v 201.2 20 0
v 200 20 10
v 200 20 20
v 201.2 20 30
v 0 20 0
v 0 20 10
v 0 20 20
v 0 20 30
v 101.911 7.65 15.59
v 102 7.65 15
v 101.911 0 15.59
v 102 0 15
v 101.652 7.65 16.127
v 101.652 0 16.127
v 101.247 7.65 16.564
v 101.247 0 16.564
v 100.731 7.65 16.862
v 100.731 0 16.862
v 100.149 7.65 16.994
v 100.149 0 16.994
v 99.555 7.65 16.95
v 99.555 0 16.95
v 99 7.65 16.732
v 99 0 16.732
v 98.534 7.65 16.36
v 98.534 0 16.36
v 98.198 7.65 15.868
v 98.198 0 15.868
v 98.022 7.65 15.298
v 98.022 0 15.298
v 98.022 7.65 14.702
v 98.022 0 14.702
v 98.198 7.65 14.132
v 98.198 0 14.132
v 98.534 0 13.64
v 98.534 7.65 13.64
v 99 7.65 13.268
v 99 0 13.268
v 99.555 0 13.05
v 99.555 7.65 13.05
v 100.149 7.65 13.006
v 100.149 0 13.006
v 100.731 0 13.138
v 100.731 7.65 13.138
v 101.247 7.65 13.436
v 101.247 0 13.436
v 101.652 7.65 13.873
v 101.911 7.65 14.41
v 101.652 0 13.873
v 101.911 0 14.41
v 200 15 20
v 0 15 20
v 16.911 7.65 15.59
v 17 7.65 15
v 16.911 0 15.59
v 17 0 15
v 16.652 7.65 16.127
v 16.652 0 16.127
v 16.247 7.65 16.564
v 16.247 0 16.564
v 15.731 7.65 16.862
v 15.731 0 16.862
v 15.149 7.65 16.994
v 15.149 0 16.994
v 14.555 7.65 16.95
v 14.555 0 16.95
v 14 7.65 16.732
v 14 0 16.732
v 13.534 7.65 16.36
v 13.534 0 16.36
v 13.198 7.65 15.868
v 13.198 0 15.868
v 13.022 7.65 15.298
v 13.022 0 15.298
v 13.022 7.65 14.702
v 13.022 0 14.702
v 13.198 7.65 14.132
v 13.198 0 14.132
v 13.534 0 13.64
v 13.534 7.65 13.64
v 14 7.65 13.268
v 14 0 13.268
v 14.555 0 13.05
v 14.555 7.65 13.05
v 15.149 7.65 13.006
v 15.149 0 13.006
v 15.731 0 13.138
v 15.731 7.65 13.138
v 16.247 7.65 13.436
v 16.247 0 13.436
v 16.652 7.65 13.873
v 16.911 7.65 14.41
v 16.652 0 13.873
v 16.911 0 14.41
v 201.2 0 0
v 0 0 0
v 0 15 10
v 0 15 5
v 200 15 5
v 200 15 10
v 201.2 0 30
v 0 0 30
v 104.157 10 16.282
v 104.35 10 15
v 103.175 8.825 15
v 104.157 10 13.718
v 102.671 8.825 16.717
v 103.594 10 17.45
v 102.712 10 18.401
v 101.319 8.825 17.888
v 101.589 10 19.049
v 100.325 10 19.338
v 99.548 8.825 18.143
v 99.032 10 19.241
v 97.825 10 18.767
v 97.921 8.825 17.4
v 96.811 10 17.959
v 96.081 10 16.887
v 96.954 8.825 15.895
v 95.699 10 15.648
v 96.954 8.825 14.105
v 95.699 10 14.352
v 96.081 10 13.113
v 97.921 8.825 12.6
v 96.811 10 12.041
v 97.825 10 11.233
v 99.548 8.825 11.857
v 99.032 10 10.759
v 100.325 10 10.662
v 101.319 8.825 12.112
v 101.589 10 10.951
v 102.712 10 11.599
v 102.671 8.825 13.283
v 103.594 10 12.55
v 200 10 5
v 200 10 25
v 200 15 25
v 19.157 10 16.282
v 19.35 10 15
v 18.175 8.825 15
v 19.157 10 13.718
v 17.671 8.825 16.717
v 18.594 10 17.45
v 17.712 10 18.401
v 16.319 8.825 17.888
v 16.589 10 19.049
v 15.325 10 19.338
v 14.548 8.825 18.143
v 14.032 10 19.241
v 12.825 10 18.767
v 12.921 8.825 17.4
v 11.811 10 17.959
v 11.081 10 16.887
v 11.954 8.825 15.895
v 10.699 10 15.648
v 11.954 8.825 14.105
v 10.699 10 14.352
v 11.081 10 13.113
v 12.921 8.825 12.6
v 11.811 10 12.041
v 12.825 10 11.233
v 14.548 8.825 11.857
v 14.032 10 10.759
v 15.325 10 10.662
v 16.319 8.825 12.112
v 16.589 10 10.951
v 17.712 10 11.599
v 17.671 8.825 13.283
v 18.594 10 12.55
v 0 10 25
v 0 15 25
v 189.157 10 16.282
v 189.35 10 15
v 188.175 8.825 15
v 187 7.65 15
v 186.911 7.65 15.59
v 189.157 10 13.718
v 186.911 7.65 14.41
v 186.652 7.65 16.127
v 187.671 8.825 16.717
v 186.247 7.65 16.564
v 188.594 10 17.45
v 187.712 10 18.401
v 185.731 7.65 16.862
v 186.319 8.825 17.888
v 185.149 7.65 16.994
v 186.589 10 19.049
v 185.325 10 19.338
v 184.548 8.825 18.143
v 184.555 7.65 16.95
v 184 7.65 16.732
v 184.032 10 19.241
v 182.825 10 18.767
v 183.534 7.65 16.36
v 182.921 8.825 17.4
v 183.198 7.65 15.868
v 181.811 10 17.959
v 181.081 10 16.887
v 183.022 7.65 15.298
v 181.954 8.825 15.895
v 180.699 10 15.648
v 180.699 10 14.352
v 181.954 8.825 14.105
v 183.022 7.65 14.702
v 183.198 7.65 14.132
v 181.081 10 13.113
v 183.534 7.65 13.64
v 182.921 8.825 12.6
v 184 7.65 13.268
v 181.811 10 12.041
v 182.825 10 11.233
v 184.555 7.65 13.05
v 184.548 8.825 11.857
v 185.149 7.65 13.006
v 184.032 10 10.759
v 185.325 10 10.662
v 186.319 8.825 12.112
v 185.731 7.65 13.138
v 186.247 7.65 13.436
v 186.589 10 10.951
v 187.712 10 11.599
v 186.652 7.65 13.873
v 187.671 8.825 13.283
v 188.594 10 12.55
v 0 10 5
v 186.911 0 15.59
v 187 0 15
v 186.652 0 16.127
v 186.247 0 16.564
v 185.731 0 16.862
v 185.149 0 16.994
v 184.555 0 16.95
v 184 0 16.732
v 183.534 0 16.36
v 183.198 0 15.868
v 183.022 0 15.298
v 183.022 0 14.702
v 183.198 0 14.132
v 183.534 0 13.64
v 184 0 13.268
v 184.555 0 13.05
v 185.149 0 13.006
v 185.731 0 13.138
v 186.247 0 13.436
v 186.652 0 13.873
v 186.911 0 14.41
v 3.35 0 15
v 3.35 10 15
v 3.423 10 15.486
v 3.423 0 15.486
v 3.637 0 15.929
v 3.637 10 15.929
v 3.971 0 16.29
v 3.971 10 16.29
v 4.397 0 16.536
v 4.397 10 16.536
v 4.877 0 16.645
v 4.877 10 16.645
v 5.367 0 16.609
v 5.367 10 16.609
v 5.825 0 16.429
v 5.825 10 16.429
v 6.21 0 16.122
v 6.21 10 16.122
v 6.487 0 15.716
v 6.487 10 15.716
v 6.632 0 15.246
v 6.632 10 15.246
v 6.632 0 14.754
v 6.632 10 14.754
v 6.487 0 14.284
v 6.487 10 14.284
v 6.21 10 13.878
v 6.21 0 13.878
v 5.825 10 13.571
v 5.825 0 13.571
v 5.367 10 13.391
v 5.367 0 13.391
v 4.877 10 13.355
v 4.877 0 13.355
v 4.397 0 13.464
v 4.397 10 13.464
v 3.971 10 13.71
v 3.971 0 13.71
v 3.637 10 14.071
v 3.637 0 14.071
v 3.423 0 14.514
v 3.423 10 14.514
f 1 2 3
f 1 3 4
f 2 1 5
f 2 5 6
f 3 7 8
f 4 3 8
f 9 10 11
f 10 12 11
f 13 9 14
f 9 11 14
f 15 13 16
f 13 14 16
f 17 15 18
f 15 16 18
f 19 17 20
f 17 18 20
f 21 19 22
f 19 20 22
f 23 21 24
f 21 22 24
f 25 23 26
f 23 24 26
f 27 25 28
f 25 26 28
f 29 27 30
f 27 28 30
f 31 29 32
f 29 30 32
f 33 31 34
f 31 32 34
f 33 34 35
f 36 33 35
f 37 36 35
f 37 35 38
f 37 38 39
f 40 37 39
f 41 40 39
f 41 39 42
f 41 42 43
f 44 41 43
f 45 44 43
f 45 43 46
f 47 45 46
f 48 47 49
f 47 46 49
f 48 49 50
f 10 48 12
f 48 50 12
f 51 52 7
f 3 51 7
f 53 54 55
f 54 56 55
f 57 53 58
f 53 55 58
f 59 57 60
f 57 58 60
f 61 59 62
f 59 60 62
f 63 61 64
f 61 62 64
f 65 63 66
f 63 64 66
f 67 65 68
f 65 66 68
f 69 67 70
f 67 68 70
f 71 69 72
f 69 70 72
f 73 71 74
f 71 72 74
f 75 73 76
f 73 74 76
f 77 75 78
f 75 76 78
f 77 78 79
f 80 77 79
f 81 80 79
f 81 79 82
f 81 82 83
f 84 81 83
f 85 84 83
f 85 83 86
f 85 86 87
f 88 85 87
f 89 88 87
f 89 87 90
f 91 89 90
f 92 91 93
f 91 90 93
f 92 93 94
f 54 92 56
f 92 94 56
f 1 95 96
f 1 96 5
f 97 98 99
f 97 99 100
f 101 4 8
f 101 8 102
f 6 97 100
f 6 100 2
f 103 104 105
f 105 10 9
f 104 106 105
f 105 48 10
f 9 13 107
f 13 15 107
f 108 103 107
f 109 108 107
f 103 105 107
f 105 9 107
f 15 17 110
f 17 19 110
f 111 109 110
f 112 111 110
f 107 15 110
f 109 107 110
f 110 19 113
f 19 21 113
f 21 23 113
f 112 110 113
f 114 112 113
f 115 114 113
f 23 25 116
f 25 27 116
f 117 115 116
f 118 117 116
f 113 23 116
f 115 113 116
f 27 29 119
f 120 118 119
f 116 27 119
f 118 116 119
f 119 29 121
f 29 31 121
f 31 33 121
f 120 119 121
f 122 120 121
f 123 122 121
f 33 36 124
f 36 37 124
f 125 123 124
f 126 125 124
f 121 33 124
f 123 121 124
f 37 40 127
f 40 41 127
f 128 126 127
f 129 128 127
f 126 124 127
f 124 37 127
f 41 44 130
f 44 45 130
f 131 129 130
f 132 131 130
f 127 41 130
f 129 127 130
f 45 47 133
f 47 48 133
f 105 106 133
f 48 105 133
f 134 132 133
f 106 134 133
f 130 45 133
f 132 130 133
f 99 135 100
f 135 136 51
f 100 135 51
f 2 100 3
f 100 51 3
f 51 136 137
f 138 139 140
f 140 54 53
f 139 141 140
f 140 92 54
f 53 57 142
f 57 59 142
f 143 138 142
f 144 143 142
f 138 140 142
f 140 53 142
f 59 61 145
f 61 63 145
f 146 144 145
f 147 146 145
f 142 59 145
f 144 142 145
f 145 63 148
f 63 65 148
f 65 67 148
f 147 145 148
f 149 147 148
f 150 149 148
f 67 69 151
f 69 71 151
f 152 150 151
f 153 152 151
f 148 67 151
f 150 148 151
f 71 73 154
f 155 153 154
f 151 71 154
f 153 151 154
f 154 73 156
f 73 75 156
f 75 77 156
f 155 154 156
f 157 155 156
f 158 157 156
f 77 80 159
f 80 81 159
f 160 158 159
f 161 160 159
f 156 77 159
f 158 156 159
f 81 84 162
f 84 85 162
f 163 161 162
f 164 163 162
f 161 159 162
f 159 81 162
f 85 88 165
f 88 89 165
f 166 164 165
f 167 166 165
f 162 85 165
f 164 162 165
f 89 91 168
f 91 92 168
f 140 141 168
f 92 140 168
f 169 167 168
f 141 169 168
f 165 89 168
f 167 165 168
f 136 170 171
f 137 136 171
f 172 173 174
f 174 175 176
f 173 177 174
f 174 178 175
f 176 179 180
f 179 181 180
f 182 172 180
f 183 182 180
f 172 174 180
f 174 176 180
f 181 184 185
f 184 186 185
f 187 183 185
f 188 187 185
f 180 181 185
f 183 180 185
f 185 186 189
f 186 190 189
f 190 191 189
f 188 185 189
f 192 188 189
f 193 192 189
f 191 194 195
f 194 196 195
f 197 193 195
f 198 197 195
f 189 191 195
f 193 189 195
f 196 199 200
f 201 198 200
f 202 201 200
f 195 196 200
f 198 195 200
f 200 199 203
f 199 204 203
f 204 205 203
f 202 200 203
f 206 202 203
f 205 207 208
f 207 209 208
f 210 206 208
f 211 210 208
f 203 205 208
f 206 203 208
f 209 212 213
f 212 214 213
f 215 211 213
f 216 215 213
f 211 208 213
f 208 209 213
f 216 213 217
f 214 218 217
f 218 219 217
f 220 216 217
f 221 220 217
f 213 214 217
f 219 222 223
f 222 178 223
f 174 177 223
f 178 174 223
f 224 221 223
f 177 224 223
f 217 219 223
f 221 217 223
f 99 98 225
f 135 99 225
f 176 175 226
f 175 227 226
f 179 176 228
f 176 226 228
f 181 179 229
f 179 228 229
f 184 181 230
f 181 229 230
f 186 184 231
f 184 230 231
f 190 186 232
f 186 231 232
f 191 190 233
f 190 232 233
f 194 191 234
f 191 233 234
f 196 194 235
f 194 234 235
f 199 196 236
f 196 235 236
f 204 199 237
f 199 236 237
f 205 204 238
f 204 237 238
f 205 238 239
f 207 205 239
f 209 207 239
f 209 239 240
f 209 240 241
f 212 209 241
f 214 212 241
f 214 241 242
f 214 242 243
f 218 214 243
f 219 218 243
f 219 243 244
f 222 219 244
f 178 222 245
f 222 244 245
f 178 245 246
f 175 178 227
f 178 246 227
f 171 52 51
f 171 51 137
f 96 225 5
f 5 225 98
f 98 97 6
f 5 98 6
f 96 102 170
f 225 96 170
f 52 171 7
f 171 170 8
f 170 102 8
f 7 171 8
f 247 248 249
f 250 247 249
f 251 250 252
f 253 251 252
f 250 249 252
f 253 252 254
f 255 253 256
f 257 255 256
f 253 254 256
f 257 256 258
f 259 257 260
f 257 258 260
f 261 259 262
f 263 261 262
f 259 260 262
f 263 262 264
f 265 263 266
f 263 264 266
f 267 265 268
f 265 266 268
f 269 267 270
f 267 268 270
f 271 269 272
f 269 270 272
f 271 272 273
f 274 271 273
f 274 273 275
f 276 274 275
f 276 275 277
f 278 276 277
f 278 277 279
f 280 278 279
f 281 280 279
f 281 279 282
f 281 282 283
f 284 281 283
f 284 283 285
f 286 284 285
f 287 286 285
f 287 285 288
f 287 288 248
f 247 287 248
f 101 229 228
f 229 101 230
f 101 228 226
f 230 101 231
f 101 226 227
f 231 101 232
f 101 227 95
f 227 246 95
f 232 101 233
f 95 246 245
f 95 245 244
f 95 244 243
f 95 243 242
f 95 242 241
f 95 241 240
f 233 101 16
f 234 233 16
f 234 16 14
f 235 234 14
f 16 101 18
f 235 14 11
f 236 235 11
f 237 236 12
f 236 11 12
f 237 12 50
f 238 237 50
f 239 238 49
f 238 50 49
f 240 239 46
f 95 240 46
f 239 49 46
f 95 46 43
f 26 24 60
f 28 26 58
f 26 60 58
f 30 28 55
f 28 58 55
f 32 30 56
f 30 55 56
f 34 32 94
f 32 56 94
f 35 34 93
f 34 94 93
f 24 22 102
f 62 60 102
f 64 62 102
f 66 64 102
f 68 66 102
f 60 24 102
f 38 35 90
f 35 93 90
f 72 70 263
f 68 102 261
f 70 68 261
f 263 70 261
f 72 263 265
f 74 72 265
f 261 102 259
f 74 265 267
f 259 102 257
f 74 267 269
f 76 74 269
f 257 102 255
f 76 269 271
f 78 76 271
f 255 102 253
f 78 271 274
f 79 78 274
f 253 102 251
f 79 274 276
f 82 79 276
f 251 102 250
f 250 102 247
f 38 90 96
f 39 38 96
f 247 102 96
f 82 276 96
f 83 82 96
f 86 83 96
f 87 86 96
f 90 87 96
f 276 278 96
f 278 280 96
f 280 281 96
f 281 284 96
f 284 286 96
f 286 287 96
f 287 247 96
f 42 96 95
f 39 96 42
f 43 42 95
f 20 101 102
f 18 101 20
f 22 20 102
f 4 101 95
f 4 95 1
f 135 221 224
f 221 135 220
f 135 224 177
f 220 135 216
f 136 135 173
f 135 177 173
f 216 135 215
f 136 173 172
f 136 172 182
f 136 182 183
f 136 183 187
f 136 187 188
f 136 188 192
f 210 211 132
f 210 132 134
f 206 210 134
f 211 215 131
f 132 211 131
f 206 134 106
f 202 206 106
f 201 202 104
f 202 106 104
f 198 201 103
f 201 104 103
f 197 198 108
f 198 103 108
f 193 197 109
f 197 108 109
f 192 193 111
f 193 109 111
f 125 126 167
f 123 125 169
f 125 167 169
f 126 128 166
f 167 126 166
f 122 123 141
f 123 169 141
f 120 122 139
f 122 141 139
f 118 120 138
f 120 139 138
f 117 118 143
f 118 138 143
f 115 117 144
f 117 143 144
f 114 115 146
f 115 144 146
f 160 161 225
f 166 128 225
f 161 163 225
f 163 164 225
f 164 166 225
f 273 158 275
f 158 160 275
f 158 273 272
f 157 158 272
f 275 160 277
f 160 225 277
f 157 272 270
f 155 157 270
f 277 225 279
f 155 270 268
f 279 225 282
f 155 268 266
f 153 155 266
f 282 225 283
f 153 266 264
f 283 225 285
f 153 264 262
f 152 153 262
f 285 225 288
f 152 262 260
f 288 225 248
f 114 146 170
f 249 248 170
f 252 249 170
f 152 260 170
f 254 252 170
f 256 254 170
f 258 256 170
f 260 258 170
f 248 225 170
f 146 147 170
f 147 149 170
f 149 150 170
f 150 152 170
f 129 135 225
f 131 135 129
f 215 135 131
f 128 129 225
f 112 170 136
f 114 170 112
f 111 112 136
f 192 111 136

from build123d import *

# Parameters (mm, degrees)
F0_W           = 5
F0_H           = 5
F1_DEPTH       = 200
F3_DEPTH       = 1.2
F5_D           = 4
F5_CSINK_D     = 8.7
F5_CSINK_ANGLE = 90
F6_DEPTH       = 25


with BuildPart() as f1:
    # F0 (on Right) → F1 (new body)
    with BuildSketch(Plane.YZ):
        Polygon((0, 30), (0, 15), (6.1031254008, 15), (10, 15), (10, 25), (15, 25), (20, 25), (20, 30), align=None)
        with Locations((17.5, 22.5)):
            Rectangle(F0_W, F0_H)
        with Locations((17.5, 7.5)):
            Rectangle(F0_W, F0_H)
        Polygon((0, 15), (0, 0), (20, 0), (20, 5), (15, 5), (10, 5), (10, 15), (6.1031254008, 15), align=None)
    extrude(amount=F1_DEPTH)

    # F2 (on face) → F3 (join)
    with BuildSketch(Plane.YZ.offset(200)):
        Polygon((20, 30), (0, 30), (0, 0), (20, 0), (20, 10), (15, 10), (15, 5), (10, 5), (10, 25), (15, 25), (15, 20), (20, 20), align=None)
        Polygon((20, 10), (20, 20), (15, 20), (15, 25), (10, 25), (10, 5), (15, 5), (15, 10), align=None)
    extrude(amount=F3_DEPTH)

    # F5 (through all)
    with Locations(Plane(origin=(0, 10, 0), x_dir=(-1, 0, 0), z_dir=(0, 1, 0))):
        with Locations((-15, 15), (-185, 15), (-100, 15)):
            CounterSinkHole(F5_D / 2, F5_CSINK_D / 2, counter_sink_angle=F5_CSINK_ANGLE)

    # F4 (on face) → F6 (cut)
    with BuildSketch(Plane(origin=(0, 10, 0), x_dir=(-1, 0, 0), z_dir=(0, 1, 0))):
        with BuildLine():
            ThreePointArc((-6.65, 15), (-5, 13.35), (-3.35, 15))
            Line((-3.35, 15), (-5, 15))
            Line((-5, 15), (-6.65, 15))
        make_face()
        with BuildLine():
            Line((-5, 15), (-3.35, 15))
            ThreePointArc((-3.35, 15), (-5, 16.65), (-6.65, 15))
            Line((-6.65, 15), (-5, 15))
        make_face()
    extrude(amount=-F6_DEPTH, mode=Mode.SUBTRACT)


solid = f1.part
